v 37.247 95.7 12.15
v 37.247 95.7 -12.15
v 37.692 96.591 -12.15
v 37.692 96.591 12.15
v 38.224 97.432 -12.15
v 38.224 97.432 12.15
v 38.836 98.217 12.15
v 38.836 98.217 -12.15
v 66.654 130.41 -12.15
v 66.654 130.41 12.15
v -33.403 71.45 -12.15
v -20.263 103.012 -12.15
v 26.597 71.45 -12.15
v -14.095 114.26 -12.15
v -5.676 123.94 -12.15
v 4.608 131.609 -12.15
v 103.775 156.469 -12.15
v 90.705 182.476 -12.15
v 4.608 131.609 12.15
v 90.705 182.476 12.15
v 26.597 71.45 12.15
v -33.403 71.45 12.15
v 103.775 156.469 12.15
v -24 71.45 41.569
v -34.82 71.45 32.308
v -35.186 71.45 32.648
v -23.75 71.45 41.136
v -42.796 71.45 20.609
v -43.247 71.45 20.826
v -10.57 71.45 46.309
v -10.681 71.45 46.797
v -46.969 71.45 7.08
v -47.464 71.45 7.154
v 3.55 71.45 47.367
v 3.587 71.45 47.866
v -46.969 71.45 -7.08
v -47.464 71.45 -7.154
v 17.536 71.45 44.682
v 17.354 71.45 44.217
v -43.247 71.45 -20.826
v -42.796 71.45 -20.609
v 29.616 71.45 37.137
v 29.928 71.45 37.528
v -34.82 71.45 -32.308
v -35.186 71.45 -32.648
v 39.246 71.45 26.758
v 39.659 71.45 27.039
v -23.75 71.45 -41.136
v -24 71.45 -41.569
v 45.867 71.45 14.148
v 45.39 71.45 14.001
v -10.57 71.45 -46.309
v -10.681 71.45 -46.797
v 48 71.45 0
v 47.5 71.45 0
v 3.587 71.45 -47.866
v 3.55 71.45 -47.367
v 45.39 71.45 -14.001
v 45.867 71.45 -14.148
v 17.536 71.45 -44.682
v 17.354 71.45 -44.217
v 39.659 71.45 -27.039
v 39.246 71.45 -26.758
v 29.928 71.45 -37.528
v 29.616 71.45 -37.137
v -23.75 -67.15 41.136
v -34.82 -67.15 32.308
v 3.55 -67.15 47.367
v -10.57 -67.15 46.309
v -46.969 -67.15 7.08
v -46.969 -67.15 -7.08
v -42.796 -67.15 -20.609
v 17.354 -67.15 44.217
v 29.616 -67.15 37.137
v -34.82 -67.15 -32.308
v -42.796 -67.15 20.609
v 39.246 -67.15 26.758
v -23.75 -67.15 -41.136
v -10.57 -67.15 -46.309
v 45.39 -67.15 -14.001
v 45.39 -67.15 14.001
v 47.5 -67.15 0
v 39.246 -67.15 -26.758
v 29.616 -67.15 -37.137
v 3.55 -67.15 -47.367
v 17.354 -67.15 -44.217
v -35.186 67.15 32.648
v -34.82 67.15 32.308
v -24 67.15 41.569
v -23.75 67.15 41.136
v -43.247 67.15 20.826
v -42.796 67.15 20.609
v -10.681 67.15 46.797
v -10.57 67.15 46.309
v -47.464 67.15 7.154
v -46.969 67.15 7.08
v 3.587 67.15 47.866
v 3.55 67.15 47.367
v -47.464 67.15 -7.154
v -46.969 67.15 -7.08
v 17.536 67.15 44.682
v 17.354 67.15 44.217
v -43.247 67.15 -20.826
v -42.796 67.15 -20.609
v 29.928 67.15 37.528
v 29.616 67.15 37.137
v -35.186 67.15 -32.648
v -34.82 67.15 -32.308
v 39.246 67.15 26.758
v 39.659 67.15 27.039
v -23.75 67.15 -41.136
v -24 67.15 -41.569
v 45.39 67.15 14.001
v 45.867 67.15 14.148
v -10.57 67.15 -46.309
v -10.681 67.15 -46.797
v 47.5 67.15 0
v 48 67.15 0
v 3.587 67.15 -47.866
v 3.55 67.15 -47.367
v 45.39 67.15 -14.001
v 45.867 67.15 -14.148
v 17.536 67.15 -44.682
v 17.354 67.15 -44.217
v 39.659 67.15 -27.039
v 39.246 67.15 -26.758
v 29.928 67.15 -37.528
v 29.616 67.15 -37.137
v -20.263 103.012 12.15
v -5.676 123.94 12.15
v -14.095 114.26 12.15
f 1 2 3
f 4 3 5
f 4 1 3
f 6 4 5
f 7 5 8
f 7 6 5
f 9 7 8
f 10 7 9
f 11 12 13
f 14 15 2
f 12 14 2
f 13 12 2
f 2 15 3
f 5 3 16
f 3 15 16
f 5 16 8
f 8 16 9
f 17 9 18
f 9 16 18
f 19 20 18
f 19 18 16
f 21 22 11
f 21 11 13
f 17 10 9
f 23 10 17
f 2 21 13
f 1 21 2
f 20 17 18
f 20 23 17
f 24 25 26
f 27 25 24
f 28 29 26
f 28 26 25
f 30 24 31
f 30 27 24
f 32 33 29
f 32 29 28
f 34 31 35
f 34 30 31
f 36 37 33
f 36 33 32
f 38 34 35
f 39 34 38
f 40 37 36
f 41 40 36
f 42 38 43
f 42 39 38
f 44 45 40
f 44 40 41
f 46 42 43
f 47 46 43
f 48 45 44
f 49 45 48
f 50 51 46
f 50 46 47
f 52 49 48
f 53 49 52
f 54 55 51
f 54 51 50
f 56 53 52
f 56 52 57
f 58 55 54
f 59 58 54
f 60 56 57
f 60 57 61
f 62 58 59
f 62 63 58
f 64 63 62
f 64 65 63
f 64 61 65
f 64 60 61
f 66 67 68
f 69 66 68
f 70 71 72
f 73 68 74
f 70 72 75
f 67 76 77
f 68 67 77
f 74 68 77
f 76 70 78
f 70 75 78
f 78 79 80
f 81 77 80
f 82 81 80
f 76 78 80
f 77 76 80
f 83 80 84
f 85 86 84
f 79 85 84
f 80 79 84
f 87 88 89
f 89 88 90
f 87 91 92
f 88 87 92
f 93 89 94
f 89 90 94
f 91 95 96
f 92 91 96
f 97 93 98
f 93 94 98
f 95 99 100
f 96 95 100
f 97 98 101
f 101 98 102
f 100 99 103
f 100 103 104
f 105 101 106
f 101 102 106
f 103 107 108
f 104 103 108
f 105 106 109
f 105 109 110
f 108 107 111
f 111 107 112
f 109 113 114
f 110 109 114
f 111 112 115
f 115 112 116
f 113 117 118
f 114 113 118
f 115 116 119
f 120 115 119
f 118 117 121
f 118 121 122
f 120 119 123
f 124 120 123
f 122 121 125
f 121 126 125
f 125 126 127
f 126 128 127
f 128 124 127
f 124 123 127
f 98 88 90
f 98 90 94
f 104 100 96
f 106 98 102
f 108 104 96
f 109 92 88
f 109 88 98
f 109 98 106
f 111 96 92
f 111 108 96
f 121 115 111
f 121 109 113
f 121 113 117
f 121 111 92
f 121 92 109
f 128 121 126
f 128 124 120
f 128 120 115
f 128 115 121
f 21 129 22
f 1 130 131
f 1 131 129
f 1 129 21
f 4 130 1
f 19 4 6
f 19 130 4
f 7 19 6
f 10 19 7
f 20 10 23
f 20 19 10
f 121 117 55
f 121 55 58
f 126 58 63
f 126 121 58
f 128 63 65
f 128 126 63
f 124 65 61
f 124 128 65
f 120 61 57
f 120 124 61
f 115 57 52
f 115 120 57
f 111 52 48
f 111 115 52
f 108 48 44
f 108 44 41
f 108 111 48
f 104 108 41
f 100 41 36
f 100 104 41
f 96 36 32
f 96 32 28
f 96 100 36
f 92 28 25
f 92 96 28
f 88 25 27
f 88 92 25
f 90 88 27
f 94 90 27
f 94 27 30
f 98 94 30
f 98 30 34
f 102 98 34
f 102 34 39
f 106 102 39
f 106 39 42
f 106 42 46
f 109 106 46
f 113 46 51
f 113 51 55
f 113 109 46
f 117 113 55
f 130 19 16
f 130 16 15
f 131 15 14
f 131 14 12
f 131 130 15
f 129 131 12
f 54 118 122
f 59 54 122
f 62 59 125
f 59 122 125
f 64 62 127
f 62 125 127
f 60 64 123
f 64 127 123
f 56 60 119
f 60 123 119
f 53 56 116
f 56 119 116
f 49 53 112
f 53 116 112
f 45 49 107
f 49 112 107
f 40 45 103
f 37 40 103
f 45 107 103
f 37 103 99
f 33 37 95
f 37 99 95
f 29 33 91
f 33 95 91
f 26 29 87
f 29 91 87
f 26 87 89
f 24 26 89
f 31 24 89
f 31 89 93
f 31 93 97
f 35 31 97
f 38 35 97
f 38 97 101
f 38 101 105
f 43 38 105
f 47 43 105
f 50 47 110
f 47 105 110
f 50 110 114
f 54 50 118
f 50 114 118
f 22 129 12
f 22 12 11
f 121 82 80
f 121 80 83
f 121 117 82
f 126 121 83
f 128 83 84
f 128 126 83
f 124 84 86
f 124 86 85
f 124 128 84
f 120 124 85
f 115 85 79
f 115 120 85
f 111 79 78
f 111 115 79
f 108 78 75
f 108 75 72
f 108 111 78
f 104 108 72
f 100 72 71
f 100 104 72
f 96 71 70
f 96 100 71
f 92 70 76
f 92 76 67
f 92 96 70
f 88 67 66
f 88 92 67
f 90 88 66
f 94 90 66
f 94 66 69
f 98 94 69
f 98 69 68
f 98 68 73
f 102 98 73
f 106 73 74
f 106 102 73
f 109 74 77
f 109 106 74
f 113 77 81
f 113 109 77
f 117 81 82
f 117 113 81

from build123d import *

# Parameters (mm, degrees)
SKETCH2_R           = 47.5
BOSS_EXTRUDE1_DEPTH = 67.15
SKETCH3_R           = 48
SKETCH3_R_2         = 47.5
BOSS_EXTRUDE2_DEPTH = 4.3
BOSS_EXTRUDE3_DEPTH = 12.15


with BuildPart() as part:
    # Sketch2 → Boss-Extrude1 (new body, symmetric)
    with BuildSketch(Plane(origin=(0, 0, 0), x_dir=(1, 0, 0), z_dir=(0, 1, 0))):
        Circle(SKETCH2_R)
    extrude(amount=BOSS_EXTRUDE1_DEPTH, both=True)


with BuildPart() as body_2:
    # Sketch3 → Boss-Extrude2 (new body)
    with BuildSketch(Plane(origin=(0, 67.15, 0), x_dir=(1, 0, 0), z_dir=(0, 1, 0))):
        Circle(SKETCH3_R)
        Circle(SKETCH3_R_2, mode=Mode.SUBTRACT)
    extrude(amount=BOSS_EXTRUDE2_DEPTH)


with BuildPart() as body_3:
    # Sketch4 → Boss-Extrude3 (new body, symmetric)
    with BuildSketch(Plane.XY):
        with BuildLine():
            Line((103.774602703, 156.469061848), (90.704504596, 182.475870743))
            Line((90.704504596, 182.475870743), (4.608125409, 131.609246215))
            ThreePointArc((4.608125409, 131.609246215), (-10.144984286, 119.325875242), (-20.263444967, 103.01170344))
            Line((-20.263444967, 103.01170344), (-33.403029121, 71.45))
            Line((-33.403029121, 71.45), (26.596970879, 71.45))
            Line((26.596970879, 71.45), (37.246730037, 95.700020494))
            ThreePointArc((37.246730037, 95.700020494), (37.947277501, 97.018131489), (38.836227203, 98.217277755))
            Line((38.836227203, 98.217277755), (66.653981734, 130.409777174))
            Line((66.653981734, 130.409777174), (103.774602703, 156.469061848))
        make_face()
    extrude(amount=BOSS_EXTRUDE3_DEPTH, both=True)


solid = Compound([part.part, body_2.part, body_3.part])
